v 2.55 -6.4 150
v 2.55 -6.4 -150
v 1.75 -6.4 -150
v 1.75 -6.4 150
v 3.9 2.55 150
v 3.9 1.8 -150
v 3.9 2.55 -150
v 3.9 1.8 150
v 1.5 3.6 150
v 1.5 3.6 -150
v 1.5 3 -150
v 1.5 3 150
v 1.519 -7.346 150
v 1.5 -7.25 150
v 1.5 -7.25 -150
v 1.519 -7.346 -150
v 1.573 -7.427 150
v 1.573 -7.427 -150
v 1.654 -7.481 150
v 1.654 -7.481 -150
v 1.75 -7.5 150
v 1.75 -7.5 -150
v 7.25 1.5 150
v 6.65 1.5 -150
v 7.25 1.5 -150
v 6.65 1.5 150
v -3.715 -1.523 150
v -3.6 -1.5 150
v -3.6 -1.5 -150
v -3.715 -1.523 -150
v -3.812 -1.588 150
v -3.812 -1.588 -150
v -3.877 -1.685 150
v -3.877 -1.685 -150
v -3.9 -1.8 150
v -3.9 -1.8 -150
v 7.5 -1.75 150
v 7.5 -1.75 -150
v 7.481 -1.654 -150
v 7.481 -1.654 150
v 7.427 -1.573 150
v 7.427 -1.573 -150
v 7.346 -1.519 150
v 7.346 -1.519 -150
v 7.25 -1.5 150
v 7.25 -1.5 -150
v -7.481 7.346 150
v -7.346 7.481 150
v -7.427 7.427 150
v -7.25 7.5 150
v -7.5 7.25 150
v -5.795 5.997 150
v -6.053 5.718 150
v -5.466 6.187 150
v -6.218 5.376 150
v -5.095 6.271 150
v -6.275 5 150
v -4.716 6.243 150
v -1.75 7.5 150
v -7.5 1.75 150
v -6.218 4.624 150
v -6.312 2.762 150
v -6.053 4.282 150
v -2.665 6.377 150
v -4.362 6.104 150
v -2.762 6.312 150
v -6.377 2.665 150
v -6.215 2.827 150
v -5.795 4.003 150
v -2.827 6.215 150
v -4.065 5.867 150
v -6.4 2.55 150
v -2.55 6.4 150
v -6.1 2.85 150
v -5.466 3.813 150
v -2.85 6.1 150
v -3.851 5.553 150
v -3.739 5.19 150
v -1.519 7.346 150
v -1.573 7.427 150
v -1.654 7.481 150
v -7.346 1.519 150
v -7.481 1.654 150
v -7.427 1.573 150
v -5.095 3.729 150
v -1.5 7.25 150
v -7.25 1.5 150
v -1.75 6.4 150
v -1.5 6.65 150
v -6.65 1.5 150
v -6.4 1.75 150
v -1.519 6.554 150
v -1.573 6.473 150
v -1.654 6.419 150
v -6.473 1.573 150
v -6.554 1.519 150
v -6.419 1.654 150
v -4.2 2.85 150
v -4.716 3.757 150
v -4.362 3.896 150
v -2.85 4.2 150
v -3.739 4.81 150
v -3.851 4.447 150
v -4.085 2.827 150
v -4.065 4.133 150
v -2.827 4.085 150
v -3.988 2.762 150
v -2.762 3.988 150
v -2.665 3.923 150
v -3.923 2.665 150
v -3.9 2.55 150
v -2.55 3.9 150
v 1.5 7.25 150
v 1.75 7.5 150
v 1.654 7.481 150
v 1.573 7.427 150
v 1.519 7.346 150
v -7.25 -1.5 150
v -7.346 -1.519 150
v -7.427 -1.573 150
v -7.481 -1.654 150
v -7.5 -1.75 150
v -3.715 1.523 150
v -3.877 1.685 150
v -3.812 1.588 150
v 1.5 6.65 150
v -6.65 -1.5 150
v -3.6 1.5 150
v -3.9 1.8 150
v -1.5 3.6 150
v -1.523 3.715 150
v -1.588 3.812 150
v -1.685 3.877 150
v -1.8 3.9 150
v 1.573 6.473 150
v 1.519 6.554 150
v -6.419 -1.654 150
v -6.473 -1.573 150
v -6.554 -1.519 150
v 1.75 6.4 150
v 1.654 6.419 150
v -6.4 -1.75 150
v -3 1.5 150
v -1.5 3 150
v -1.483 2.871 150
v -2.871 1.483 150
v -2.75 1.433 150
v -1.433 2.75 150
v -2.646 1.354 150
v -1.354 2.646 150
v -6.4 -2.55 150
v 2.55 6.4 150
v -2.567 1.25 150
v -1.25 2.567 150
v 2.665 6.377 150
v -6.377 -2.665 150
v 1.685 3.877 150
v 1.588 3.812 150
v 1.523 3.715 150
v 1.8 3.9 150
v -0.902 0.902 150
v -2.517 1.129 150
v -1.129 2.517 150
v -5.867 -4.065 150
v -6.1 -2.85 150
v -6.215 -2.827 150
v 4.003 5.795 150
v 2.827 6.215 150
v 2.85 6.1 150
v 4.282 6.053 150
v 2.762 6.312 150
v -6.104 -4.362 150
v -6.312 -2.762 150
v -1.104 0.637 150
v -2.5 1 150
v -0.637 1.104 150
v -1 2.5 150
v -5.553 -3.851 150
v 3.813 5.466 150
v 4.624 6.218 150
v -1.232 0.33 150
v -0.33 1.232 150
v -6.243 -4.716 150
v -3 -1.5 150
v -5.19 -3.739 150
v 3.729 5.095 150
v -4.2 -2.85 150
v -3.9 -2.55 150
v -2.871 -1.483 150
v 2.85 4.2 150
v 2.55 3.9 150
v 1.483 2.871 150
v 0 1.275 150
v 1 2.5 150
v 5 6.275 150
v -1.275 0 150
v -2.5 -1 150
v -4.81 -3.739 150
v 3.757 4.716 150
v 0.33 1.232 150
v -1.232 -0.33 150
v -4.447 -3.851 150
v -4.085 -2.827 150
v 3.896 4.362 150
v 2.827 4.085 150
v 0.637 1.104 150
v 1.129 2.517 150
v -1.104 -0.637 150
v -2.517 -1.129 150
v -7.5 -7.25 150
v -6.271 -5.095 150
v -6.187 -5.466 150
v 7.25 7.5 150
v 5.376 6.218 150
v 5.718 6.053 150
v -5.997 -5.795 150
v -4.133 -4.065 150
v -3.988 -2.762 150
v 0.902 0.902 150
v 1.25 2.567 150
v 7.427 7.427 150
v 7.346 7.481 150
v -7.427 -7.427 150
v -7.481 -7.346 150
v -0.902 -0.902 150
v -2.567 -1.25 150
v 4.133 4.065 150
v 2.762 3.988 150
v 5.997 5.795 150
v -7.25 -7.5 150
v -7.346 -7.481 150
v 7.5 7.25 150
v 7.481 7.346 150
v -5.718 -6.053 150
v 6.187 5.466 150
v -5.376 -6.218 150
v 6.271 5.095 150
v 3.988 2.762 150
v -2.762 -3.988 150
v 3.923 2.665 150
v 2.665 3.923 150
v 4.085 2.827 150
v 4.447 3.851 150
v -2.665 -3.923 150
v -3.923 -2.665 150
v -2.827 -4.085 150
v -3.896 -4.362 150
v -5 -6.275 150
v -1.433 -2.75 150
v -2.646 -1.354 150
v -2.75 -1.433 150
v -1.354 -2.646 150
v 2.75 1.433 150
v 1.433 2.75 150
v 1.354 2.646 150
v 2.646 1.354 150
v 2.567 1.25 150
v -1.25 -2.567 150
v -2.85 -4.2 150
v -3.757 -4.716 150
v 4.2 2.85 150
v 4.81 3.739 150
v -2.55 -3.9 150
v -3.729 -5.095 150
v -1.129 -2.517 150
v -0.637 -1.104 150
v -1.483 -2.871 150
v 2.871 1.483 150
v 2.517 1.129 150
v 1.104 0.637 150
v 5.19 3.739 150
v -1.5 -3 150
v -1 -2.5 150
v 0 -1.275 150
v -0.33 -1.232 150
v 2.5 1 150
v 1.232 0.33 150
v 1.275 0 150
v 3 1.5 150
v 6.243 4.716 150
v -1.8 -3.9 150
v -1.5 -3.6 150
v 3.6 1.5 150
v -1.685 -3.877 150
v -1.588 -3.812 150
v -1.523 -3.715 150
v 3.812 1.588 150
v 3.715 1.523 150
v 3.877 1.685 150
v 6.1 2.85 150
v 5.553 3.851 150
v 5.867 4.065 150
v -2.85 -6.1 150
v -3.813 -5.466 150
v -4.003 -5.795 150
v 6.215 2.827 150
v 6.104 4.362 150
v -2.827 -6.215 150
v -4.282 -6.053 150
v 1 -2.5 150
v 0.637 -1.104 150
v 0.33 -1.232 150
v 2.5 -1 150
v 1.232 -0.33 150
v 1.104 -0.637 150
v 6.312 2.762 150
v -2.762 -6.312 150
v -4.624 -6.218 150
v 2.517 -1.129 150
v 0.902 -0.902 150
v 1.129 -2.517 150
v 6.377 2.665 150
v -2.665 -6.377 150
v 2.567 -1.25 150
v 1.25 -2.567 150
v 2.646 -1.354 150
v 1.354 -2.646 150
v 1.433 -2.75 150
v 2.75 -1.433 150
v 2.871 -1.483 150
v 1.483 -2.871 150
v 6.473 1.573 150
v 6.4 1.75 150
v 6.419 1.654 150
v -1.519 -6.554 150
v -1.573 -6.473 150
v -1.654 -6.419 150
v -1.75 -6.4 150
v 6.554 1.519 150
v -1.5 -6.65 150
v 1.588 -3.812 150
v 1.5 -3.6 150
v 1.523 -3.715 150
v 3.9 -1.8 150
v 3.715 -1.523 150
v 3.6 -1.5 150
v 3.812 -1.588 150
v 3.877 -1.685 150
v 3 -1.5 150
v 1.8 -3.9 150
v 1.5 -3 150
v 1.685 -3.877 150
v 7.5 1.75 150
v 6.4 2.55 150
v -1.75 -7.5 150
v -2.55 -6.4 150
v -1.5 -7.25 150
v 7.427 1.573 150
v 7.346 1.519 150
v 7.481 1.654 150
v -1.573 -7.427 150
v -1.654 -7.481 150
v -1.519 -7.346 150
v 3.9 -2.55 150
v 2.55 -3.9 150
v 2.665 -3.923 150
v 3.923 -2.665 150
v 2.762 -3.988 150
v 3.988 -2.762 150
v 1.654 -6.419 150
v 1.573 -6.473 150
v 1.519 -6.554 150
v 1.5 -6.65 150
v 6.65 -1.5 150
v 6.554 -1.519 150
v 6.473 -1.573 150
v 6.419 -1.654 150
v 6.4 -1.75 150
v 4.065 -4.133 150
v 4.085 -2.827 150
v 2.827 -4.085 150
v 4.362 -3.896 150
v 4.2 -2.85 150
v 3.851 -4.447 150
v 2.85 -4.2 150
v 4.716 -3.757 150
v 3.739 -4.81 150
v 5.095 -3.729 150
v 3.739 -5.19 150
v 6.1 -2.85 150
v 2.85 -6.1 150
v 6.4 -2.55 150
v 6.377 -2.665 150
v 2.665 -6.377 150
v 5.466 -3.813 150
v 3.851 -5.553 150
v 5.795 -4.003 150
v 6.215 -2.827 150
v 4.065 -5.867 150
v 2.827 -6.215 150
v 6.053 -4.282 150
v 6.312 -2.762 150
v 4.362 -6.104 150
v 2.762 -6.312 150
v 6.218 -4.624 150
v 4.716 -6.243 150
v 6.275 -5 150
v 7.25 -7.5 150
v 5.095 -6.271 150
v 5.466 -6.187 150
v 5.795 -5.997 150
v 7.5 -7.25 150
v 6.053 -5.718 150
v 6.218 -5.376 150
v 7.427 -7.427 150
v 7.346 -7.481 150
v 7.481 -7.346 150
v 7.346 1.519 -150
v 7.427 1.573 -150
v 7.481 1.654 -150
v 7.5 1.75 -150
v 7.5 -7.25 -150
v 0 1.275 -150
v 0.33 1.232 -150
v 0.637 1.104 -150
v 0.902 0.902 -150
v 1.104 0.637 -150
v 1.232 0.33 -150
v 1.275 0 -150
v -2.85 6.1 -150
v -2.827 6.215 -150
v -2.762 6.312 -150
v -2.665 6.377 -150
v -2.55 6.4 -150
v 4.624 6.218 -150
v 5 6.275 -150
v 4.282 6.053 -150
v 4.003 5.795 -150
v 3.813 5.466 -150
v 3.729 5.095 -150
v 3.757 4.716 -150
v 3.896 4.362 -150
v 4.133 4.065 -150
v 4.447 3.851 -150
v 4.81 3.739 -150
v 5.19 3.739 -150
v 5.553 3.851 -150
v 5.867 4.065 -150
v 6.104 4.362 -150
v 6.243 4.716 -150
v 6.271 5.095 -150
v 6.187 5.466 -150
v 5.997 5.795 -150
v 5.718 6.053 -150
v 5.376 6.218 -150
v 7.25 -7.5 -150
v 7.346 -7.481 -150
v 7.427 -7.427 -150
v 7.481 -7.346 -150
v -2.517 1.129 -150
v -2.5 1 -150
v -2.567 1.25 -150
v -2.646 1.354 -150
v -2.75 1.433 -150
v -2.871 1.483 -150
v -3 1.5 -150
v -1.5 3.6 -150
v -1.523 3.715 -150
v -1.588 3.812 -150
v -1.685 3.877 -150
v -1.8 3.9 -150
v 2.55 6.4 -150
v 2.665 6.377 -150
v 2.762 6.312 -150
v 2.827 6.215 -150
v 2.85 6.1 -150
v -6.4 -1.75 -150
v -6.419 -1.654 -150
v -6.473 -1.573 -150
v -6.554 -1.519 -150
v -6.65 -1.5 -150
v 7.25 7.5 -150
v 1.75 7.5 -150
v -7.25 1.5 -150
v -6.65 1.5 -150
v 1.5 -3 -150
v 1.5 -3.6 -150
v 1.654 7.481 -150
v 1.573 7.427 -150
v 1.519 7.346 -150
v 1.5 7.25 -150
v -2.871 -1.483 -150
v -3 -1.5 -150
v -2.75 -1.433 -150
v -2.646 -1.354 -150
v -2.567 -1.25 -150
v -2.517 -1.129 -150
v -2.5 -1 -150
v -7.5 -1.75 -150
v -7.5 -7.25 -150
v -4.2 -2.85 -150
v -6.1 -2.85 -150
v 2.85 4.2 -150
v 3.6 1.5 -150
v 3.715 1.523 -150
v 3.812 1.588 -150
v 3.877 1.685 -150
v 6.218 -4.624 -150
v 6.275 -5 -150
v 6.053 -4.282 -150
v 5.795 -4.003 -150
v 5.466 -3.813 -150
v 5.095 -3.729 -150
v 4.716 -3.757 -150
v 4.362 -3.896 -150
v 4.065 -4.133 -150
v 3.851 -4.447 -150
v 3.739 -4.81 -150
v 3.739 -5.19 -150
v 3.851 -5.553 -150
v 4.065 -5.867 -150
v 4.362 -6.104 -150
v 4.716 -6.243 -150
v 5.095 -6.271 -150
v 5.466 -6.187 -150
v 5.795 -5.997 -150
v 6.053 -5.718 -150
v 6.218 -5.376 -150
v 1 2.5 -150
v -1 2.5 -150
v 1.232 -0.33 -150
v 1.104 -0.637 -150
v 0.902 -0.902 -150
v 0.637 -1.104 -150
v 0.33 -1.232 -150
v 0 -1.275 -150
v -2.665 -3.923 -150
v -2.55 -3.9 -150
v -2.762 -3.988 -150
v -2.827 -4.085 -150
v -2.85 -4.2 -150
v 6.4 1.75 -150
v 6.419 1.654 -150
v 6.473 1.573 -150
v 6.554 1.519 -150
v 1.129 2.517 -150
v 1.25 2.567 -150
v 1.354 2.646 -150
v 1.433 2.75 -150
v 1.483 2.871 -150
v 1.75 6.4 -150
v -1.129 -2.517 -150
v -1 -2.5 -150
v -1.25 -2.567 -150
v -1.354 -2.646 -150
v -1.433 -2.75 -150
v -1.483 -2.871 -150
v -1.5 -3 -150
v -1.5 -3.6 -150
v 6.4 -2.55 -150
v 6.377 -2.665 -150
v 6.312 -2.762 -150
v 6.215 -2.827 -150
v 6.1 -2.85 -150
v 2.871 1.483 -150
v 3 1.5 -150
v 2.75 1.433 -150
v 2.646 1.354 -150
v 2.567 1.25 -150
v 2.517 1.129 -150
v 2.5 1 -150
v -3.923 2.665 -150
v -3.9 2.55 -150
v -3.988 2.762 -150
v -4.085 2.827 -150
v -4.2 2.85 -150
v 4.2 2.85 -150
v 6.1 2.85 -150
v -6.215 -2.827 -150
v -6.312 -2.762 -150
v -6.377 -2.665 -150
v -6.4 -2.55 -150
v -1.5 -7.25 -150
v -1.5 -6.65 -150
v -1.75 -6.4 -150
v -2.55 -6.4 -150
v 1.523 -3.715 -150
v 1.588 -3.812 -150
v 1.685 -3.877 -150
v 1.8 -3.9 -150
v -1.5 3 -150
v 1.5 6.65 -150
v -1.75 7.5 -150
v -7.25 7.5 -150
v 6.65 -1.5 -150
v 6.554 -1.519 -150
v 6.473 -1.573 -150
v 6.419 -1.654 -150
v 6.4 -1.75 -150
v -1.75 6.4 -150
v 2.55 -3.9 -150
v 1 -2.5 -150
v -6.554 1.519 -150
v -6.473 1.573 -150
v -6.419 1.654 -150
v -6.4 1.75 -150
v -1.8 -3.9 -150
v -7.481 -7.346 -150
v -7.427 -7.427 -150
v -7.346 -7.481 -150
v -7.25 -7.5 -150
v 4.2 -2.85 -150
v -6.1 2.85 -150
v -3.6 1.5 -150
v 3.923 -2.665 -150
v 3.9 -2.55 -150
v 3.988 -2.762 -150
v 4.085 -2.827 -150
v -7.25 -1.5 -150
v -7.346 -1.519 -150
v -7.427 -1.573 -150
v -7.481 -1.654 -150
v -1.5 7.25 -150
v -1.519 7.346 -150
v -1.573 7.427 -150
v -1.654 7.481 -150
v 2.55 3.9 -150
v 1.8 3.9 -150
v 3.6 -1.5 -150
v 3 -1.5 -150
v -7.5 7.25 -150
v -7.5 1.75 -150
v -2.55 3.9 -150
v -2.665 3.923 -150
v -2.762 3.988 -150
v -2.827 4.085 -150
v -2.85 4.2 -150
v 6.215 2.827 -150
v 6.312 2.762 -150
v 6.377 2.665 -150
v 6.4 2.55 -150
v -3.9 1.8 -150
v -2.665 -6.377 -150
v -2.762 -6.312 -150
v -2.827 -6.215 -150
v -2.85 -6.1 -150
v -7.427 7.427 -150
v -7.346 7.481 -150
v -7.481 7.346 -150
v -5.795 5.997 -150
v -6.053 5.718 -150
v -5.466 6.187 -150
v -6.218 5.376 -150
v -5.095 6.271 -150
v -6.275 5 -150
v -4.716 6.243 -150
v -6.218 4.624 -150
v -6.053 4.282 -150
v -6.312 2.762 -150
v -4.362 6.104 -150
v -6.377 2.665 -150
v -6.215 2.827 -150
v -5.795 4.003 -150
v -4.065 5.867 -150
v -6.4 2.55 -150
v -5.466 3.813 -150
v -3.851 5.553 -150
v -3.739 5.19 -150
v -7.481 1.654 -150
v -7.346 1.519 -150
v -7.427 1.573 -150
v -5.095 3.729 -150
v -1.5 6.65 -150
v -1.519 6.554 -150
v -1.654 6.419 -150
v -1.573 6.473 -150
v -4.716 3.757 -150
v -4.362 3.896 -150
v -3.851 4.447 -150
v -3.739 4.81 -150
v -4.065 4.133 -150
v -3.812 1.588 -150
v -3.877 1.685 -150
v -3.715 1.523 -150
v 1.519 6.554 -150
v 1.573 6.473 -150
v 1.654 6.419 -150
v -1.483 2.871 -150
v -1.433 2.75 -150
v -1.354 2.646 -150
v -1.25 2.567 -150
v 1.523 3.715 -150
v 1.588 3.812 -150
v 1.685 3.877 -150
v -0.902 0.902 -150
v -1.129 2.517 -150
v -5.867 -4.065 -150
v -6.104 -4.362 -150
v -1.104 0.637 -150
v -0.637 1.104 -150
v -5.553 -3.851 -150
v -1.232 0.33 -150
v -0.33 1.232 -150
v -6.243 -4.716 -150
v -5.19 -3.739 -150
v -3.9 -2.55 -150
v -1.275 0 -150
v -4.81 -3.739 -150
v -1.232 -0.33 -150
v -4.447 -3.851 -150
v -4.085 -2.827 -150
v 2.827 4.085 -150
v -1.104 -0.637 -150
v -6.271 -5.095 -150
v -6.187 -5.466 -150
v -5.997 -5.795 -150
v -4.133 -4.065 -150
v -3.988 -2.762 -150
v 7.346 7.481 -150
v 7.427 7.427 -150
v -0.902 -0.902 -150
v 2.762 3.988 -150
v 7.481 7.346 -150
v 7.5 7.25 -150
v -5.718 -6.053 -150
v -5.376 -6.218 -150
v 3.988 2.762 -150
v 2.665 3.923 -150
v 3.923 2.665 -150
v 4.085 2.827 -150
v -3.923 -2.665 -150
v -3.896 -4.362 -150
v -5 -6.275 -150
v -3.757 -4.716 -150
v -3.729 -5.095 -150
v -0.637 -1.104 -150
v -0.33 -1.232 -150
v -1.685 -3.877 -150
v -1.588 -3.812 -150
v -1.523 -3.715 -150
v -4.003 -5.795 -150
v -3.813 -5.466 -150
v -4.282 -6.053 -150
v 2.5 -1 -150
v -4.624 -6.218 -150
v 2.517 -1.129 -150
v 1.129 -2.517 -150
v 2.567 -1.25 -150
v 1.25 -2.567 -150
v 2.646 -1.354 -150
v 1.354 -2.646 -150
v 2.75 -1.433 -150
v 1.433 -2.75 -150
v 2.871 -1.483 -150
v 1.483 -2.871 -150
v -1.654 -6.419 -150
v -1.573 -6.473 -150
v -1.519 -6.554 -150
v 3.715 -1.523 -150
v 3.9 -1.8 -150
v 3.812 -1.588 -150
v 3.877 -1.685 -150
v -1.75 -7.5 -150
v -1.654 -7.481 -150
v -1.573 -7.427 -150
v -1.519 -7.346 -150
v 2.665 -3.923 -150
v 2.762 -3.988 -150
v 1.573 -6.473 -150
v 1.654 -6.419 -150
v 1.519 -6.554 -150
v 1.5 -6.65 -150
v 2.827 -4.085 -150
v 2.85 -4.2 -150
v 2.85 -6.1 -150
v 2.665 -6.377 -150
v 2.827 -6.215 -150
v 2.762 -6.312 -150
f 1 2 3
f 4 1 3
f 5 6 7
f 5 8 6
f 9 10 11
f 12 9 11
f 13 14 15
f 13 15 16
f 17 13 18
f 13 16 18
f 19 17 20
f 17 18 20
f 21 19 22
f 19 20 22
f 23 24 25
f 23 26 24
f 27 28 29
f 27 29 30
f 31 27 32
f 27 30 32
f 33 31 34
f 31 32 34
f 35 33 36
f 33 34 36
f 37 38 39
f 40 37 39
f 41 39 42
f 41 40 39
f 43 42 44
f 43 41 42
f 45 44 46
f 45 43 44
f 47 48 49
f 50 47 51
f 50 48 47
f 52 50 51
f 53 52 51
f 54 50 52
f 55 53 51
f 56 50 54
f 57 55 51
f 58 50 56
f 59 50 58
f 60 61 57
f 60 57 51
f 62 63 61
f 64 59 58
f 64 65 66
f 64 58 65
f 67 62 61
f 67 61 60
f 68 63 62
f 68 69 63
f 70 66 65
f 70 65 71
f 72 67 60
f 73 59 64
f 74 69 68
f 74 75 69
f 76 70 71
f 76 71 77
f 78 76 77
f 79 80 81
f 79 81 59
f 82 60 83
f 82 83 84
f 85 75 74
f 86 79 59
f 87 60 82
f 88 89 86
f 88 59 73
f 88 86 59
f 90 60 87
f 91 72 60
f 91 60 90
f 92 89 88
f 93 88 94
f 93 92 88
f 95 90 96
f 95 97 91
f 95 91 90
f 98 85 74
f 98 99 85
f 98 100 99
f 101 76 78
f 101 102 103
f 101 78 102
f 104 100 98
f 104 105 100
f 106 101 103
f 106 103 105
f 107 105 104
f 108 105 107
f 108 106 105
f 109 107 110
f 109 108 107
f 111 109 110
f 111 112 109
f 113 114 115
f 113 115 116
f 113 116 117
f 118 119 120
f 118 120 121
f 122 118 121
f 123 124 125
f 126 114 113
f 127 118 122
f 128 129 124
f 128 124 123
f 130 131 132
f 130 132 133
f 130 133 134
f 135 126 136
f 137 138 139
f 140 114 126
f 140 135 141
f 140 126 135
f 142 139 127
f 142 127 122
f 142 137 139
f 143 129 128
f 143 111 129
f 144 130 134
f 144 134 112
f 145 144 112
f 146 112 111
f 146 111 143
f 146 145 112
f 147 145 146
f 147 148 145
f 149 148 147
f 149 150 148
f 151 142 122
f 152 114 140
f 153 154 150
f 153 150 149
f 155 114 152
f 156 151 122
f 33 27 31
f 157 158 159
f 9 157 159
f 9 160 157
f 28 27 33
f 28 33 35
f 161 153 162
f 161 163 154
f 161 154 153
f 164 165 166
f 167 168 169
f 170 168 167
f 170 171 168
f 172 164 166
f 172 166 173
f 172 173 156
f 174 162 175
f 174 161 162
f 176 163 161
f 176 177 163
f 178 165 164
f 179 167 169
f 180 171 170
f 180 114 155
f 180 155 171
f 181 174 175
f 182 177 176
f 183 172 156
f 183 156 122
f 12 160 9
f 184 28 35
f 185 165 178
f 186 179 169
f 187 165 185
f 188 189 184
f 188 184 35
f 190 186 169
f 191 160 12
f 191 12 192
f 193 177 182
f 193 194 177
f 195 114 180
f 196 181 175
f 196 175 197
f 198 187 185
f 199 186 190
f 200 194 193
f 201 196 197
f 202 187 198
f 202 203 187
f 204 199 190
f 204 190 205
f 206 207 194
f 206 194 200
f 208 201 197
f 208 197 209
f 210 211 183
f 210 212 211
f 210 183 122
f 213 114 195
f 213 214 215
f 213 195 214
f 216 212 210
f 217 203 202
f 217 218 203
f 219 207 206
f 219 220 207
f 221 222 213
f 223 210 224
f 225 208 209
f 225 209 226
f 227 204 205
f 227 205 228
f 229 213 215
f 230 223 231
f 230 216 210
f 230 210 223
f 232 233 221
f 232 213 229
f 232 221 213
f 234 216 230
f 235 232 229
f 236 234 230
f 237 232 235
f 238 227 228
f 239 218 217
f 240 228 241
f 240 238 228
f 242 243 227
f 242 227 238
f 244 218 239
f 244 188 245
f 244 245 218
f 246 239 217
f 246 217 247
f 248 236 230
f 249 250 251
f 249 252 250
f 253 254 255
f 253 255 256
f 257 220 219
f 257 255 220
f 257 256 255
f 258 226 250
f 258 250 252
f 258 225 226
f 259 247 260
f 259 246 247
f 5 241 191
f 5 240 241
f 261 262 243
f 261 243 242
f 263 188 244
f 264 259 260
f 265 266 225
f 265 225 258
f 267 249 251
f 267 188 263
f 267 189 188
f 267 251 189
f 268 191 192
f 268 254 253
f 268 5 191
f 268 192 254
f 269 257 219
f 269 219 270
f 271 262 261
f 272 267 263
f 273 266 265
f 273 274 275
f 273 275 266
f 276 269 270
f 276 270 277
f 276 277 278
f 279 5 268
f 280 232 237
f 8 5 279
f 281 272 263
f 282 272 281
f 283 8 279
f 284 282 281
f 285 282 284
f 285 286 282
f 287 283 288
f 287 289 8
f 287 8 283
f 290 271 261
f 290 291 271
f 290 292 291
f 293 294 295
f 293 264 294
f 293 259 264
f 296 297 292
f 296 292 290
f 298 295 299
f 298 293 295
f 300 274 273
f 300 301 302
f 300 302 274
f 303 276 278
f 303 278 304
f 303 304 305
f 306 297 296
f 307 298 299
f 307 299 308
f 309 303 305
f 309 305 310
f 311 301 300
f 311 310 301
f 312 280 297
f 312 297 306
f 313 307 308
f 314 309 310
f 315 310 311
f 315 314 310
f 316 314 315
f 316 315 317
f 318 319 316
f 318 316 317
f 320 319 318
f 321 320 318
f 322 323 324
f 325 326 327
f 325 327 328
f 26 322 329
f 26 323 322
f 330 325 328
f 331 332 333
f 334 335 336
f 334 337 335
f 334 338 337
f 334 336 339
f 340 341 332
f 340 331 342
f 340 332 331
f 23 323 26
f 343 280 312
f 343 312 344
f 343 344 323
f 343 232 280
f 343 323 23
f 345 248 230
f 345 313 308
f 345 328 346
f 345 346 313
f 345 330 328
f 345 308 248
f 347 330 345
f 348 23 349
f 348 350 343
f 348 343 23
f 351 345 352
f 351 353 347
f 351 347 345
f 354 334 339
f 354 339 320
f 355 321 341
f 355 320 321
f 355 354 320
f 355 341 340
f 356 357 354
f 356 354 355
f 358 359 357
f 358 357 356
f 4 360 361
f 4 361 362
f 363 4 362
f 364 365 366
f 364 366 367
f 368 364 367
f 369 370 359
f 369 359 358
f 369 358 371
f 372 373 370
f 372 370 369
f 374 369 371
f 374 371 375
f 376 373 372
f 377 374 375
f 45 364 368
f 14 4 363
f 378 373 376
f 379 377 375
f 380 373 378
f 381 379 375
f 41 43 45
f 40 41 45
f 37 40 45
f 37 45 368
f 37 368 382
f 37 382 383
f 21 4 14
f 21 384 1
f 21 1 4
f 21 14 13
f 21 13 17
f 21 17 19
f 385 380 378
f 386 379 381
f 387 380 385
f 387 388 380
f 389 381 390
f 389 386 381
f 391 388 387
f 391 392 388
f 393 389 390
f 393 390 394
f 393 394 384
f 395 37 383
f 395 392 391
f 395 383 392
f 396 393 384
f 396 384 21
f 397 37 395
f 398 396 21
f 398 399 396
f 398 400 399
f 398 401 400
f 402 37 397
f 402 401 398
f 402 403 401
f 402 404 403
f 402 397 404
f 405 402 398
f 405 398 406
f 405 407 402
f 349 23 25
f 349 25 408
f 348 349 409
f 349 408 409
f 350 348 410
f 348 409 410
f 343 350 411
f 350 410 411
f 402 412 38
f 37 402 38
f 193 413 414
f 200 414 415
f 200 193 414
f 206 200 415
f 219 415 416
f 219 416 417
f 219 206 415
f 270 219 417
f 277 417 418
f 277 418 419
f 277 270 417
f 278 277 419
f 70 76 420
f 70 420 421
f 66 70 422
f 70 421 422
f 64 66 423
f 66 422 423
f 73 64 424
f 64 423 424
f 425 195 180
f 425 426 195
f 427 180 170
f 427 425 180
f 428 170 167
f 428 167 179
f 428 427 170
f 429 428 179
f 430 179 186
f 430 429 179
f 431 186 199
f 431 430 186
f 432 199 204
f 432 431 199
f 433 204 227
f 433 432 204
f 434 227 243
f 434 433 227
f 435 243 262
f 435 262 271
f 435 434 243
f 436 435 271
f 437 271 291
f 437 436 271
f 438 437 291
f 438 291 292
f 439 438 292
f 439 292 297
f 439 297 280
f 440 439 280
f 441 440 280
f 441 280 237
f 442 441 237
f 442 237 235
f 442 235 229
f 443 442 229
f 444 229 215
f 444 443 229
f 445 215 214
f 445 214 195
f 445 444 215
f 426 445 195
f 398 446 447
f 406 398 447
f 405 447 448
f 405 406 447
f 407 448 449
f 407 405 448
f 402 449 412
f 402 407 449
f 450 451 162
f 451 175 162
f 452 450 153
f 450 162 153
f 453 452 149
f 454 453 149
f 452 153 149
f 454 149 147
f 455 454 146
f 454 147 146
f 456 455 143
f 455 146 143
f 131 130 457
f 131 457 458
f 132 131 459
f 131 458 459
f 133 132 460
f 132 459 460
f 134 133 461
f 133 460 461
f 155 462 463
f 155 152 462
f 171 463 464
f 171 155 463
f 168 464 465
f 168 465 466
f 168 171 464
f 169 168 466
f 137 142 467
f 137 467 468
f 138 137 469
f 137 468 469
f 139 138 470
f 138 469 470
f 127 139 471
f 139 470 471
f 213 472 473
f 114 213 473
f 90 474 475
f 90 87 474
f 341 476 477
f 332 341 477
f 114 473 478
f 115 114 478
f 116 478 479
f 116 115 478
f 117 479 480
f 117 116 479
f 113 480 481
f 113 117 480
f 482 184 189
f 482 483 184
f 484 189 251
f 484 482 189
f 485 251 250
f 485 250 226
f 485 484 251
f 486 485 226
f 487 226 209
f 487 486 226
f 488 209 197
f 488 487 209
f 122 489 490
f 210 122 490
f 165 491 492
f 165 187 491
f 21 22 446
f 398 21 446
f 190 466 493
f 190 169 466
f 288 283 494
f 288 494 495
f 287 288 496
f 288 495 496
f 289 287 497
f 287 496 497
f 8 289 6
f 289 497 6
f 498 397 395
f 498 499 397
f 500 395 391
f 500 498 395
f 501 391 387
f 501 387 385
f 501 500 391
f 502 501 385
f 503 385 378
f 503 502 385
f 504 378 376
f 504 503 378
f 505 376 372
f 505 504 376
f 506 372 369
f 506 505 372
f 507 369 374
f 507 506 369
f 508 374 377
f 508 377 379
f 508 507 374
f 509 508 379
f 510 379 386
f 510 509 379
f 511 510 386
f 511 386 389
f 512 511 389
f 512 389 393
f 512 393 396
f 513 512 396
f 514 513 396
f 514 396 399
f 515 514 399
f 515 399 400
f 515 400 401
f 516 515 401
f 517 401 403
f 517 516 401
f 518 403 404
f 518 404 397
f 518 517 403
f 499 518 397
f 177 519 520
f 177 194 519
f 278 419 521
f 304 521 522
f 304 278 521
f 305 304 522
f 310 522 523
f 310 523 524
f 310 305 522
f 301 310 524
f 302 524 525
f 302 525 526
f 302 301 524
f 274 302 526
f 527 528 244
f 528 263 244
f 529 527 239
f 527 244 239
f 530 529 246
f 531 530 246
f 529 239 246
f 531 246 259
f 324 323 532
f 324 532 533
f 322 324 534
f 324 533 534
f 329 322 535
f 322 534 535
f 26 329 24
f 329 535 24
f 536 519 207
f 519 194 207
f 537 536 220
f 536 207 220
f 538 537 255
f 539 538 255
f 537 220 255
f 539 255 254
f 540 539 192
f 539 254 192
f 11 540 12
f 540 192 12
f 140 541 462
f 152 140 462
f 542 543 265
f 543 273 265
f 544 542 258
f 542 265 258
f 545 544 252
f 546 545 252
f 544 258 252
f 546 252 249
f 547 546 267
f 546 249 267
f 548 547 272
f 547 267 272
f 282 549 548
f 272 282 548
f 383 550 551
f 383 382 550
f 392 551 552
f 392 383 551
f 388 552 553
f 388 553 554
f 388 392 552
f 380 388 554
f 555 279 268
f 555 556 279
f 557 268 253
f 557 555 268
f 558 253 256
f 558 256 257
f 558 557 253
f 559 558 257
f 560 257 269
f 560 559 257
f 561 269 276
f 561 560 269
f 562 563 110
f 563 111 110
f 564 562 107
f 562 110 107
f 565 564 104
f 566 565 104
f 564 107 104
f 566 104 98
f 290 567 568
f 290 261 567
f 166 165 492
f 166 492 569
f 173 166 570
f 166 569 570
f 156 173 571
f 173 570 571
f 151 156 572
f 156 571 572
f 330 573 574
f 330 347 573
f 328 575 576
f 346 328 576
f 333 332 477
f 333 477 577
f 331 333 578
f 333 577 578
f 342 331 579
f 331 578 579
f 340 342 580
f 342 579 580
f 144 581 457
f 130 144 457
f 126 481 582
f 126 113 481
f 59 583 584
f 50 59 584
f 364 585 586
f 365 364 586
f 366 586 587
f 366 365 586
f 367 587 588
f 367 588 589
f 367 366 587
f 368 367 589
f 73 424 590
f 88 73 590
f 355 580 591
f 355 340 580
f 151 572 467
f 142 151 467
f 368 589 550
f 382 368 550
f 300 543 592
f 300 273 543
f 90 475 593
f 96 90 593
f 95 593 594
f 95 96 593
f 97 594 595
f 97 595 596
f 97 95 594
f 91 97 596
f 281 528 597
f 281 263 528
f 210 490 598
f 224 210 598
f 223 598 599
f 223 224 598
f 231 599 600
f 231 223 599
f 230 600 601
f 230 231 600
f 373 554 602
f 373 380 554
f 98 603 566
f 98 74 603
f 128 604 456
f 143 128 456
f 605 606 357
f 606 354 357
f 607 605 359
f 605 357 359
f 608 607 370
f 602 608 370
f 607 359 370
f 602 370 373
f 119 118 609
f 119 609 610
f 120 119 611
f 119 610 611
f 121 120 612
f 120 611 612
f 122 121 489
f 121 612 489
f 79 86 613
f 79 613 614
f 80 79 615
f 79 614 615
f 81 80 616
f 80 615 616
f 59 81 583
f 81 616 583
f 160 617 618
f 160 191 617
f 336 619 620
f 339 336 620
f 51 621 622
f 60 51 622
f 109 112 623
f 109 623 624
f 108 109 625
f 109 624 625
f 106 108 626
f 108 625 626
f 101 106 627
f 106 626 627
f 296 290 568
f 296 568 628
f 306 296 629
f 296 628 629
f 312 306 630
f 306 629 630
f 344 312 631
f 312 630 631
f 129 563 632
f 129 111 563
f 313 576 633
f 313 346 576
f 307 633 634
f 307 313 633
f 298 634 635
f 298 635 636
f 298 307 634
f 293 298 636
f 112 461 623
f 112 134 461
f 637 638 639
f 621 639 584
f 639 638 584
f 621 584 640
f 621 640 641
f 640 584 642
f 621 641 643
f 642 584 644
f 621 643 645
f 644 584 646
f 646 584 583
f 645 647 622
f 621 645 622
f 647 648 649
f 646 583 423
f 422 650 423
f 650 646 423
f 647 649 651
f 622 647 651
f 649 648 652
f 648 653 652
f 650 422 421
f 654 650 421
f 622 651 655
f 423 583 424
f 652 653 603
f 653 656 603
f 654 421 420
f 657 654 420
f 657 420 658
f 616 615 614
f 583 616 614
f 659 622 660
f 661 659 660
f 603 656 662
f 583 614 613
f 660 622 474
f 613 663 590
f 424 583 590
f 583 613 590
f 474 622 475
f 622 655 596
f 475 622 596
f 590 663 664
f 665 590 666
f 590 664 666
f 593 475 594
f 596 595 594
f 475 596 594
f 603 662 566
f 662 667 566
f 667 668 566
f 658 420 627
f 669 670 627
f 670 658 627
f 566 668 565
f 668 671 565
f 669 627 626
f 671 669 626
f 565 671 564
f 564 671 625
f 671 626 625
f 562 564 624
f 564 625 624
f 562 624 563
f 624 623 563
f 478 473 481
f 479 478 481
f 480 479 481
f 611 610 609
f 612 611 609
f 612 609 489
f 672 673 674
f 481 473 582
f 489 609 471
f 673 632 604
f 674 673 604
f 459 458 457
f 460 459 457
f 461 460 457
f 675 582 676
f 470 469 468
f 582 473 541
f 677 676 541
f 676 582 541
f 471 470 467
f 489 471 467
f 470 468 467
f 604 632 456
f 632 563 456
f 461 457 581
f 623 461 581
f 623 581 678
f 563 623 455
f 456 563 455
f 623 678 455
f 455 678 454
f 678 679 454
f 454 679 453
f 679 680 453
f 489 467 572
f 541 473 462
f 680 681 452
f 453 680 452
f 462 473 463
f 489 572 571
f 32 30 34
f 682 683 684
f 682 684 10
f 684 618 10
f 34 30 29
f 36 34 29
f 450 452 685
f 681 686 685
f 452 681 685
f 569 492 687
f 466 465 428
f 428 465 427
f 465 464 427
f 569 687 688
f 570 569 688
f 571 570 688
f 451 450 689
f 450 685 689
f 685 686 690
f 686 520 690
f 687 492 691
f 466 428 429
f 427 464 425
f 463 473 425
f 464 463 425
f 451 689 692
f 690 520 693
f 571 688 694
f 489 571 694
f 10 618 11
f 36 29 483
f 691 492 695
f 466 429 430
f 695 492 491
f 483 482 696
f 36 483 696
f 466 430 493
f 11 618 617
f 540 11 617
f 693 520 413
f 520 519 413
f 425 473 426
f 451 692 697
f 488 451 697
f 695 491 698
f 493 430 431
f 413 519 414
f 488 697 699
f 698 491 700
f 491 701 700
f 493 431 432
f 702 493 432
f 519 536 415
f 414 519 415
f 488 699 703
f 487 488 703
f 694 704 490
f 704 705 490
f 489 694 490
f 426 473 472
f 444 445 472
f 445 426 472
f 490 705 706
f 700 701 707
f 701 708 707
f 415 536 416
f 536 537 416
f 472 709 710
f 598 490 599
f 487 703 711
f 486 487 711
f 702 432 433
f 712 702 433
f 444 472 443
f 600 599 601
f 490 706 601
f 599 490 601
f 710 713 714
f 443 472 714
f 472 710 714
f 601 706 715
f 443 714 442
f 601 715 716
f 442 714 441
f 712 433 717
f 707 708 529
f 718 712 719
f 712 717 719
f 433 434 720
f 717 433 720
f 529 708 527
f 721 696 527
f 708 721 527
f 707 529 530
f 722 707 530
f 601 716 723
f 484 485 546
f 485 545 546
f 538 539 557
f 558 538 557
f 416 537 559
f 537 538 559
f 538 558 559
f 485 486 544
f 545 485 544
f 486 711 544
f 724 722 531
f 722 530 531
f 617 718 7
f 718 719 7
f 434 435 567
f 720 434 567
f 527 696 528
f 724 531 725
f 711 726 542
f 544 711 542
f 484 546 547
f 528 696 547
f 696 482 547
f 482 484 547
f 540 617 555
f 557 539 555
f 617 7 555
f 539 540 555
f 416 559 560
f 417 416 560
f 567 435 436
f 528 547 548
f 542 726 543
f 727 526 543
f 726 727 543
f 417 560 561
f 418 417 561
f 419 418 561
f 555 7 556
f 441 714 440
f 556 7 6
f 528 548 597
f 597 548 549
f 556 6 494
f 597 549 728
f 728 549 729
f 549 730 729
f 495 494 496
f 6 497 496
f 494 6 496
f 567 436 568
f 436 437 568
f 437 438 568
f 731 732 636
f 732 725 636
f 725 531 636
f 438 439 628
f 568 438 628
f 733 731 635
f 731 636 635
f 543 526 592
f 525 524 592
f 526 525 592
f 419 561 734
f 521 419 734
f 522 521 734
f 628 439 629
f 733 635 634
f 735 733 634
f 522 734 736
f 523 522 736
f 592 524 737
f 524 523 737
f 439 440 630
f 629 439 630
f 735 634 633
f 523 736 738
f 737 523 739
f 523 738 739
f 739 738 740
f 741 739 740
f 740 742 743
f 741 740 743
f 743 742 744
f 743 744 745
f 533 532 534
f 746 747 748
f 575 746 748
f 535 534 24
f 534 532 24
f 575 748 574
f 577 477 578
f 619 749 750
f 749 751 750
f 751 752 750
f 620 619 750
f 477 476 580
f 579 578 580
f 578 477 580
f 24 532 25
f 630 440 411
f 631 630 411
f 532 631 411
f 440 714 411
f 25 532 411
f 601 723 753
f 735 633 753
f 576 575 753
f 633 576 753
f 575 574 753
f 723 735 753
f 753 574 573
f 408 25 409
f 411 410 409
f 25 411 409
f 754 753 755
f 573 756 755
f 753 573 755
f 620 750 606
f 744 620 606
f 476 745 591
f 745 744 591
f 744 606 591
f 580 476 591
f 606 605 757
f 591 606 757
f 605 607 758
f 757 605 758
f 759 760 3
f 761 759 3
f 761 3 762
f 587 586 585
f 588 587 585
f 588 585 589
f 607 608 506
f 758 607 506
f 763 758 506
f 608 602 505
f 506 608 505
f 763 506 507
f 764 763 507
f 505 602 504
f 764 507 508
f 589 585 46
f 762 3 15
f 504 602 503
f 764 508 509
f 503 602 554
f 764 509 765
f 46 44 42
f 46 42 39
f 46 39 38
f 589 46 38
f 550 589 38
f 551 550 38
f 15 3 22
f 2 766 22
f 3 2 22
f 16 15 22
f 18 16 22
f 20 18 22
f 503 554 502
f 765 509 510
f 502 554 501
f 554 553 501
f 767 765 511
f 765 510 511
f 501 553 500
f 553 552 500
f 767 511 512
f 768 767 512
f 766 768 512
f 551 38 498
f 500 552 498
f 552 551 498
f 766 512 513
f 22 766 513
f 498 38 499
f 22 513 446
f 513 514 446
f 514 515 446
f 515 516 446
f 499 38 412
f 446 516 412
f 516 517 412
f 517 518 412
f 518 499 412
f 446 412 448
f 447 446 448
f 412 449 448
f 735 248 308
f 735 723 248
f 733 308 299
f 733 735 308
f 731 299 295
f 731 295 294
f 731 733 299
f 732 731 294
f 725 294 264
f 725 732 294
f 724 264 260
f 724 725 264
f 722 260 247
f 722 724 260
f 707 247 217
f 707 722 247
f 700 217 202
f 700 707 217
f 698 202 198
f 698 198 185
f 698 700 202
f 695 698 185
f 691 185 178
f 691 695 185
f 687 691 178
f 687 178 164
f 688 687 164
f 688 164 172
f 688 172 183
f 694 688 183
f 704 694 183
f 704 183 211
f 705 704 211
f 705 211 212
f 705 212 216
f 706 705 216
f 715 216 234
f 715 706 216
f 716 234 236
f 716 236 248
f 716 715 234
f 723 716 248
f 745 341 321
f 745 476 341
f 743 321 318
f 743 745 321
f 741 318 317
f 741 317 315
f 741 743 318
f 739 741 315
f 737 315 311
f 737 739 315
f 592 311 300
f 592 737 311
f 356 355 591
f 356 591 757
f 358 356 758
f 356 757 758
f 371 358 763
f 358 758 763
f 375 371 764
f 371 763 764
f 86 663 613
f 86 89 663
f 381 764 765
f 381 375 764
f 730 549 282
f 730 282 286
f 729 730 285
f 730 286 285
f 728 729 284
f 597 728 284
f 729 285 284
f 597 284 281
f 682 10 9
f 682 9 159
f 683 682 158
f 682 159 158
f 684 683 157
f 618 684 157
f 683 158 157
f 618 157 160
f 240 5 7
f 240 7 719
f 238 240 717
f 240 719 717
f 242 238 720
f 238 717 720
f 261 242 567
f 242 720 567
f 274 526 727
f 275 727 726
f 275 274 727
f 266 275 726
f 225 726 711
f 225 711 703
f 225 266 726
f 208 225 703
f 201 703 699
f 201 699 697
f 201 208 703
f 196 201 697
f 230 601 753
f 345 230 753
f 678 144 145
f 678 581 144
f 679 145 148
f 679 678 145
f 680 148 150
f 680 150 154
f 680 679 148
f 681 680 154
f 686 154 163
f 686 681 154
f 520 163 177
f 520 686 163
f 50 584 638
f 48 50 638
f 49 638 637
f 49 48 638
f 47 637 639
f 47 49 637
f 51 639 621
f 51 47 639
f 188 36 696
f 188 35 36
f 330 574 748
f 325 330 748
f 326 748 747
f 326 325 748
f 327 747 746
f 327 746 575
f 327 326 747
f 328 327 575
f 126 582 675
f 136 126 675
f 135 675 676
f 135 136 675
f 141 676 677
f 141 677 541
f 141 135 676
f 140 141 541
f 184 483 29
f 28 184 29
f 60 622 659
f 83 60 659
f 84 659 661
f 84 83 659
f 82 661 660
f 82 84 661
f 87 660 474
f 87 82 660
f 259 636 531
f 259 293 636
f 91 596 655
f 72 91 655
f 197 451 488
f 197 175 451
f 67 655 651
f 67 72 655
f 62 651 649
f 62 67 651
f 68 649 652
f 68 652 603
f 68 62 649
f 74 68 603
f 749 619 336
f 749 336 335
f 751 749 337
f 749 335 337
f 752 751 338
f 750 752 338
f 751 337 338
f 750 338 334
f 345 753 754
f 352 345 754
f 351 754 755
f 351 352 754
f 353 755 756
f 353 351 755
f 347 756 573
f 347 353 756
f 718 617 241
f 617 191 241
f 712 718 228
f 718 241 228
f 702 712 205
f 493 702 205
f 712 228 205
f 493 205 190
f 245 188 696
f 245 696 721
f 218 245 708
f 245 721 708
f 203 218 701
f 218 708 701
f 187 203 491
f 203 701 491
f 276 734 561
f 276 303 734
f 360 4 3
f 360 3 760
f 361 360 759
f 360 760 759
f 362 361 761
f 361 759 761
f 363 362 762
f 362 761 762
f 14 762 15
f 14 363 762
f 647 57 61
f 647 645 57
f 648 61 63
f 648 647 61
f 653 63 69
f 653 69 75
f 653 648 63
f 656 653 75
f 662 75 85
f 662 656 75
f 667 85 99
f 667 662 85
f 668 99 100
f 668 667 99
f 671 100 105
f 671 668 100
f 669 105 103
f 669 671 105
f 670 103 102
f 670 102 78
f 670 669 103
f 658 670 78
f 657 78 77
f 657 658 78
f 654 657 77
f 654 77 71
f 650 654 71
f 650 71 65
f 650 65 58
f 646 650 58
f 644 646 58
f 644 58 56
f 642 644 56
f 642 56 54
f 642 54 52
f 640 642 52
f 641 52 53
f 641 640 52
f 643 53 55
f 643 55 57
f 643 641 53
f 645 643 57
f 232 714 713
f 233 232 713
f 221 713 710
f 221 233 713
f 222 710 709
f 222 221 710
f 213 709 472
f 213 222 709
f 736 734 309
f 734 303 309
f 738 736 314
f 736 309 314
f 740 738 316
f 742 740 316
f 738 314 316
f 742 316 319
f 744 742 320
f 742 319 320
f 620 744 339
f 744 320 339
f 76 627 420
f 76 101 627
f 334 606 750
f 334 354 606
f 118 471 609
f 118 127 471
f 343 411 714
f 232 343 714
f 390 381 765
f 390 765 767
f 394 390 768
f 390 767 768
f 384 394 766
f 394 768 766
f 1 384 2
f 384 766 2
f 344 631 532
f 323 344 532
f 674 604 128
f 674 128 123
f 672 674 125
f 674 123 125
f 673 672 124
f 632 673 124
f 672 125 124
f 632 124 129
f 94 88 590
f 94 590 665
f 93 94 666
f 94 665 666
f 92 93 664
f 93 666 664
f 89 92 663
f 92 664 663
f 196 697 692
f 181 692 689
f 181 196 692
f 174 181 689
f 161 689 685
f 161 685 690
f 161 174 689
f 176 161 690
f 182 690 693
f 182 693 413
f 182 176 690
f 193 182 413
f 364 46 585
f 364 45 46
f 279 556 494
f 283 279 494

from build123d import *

# Parameters (mm, degrees)
SKETCH1_R           = 1.275
BOSS_EXTRUDE1_DEPTH = 150
FILLET2_R           = 0.5
FILLET3_R           = 0.3
FILLET1_R           = 0.25
CIRPATTERN1_COUNT   = 4


with BuildPart() as part:
    # Sketch1 → Boss-Extrude1 (new, symmetric)
    with BuildSketch(Plane.XY):
        with BuildLine():
            Line((1.5, -7.5), (7.25, -7.5))
            ThreePointArc((7.25, -7.5), (7.426776695, -7.426776695), (7.5, -7.25))
            Line((7.5, -7.25), (7.5, -1.5))
            Line((7.5, -1.5), (6.4, -1.5))
            Line((6.4, -1.5), (6.4, -2.85))
            Line((6.4, -2.85), (3.9, -2.85))
            Line((3.9, -2.85), (3.9, -1.5))
            Line((3.9, -1.5), (2.5, -1.5))
            Line((2.5, -1.5), (2.5, 0))
            Line((2.5, 0), (1.275, 0))
            ThreePointArc((1.275, 0), (0.901561146, -0.901561146), (0, -1.275))
            Line((0, -1.275), (0, -2.5))
            Line((0, -2.5), (1.5, -2.5))
            Line((1.5, -2.5), (1.5, -3.9))
            Line((1.5, -3.9), (2.85, -3.9))
            Line((2.85, -3.9), (2.85, -6.4))
            Line((2.85, -6.4), (1.5, -6.4))
            Line((1.5, -6.4), (1.5, -7.5))
        make_face()
        with Locations((5, -5)):
            Circle(SKETCH1_R, mode=Mode.SUBTRACT)
    extrude(amount=BOSS_EXTRUDE1_DEPTH, both=True)

    # Fillet2
    fillet2_edges = [part.edges().sort_by_distance(p)[0] for p in [
        (2.5, -1.5, 0),
        (1.5, -2.5, 0),
    ]]
    fillet(fillet2_edges, radius=FILLET2_R)

    # Fillet3
    fillet3_edges = [part.edges().sort_by_distance(p)[0] for p in [
        (3.9, -1.5, 0),
        (3.9, -2.85, 0),
        (6.4, -2.85, 0),
        (2.85, -6.4, 0),
        (2.85, -3.9, 0),
        (1.5, -3.9, 0),
    ]]
    fillet(fillet3_edges, radius=FILLET3_R)

    # Fillet1
    fillet1_edges = [part.edges().sort_by_distance(p)[0] for p in [
        (6.4, -1.5, 0),
        (7.5, -1.5, 0),
        (1.5, -7.5, 0),
        (1.5, -6.4, 0),
    ]]
    fillet(fillet1_edges, radius=FILLET1_R)


with BuildPart() as cirpattern1_1:
    # CirPattern1: pattern copy
    add(part.part.rotate(Axis((0, 0, 0), (0, 0, 1)), 1 * 360 / CIRPATTERN1_COUNT))


with BuildPart() as cirpattern1_2:
    # CirPattern1: pattern copy
    add(part.part.rotate(Axis((0, 0, 0), (0, 0, 1)), 2 * 360 / CIRPATTERN1_COUNT))


with BuildPart() as cirpattern1_3:
    # CirPattern1: pattern copy
    add(part.part.rotate(Axis((0, 0, 0), (0, 0, 1)), 3 * 360 / CIRPATTERN1_COUNT))


with BuildPart() as part_1:
    add(part.part)

    # Combine1: union CirPattern1_1, CirPattern1_2, CirPattern1_3
    add(cirpattern1_1.part)
    add(cirpattern1_2.part)
    add(cirpattern1_3.part)


solid = part_1.part
